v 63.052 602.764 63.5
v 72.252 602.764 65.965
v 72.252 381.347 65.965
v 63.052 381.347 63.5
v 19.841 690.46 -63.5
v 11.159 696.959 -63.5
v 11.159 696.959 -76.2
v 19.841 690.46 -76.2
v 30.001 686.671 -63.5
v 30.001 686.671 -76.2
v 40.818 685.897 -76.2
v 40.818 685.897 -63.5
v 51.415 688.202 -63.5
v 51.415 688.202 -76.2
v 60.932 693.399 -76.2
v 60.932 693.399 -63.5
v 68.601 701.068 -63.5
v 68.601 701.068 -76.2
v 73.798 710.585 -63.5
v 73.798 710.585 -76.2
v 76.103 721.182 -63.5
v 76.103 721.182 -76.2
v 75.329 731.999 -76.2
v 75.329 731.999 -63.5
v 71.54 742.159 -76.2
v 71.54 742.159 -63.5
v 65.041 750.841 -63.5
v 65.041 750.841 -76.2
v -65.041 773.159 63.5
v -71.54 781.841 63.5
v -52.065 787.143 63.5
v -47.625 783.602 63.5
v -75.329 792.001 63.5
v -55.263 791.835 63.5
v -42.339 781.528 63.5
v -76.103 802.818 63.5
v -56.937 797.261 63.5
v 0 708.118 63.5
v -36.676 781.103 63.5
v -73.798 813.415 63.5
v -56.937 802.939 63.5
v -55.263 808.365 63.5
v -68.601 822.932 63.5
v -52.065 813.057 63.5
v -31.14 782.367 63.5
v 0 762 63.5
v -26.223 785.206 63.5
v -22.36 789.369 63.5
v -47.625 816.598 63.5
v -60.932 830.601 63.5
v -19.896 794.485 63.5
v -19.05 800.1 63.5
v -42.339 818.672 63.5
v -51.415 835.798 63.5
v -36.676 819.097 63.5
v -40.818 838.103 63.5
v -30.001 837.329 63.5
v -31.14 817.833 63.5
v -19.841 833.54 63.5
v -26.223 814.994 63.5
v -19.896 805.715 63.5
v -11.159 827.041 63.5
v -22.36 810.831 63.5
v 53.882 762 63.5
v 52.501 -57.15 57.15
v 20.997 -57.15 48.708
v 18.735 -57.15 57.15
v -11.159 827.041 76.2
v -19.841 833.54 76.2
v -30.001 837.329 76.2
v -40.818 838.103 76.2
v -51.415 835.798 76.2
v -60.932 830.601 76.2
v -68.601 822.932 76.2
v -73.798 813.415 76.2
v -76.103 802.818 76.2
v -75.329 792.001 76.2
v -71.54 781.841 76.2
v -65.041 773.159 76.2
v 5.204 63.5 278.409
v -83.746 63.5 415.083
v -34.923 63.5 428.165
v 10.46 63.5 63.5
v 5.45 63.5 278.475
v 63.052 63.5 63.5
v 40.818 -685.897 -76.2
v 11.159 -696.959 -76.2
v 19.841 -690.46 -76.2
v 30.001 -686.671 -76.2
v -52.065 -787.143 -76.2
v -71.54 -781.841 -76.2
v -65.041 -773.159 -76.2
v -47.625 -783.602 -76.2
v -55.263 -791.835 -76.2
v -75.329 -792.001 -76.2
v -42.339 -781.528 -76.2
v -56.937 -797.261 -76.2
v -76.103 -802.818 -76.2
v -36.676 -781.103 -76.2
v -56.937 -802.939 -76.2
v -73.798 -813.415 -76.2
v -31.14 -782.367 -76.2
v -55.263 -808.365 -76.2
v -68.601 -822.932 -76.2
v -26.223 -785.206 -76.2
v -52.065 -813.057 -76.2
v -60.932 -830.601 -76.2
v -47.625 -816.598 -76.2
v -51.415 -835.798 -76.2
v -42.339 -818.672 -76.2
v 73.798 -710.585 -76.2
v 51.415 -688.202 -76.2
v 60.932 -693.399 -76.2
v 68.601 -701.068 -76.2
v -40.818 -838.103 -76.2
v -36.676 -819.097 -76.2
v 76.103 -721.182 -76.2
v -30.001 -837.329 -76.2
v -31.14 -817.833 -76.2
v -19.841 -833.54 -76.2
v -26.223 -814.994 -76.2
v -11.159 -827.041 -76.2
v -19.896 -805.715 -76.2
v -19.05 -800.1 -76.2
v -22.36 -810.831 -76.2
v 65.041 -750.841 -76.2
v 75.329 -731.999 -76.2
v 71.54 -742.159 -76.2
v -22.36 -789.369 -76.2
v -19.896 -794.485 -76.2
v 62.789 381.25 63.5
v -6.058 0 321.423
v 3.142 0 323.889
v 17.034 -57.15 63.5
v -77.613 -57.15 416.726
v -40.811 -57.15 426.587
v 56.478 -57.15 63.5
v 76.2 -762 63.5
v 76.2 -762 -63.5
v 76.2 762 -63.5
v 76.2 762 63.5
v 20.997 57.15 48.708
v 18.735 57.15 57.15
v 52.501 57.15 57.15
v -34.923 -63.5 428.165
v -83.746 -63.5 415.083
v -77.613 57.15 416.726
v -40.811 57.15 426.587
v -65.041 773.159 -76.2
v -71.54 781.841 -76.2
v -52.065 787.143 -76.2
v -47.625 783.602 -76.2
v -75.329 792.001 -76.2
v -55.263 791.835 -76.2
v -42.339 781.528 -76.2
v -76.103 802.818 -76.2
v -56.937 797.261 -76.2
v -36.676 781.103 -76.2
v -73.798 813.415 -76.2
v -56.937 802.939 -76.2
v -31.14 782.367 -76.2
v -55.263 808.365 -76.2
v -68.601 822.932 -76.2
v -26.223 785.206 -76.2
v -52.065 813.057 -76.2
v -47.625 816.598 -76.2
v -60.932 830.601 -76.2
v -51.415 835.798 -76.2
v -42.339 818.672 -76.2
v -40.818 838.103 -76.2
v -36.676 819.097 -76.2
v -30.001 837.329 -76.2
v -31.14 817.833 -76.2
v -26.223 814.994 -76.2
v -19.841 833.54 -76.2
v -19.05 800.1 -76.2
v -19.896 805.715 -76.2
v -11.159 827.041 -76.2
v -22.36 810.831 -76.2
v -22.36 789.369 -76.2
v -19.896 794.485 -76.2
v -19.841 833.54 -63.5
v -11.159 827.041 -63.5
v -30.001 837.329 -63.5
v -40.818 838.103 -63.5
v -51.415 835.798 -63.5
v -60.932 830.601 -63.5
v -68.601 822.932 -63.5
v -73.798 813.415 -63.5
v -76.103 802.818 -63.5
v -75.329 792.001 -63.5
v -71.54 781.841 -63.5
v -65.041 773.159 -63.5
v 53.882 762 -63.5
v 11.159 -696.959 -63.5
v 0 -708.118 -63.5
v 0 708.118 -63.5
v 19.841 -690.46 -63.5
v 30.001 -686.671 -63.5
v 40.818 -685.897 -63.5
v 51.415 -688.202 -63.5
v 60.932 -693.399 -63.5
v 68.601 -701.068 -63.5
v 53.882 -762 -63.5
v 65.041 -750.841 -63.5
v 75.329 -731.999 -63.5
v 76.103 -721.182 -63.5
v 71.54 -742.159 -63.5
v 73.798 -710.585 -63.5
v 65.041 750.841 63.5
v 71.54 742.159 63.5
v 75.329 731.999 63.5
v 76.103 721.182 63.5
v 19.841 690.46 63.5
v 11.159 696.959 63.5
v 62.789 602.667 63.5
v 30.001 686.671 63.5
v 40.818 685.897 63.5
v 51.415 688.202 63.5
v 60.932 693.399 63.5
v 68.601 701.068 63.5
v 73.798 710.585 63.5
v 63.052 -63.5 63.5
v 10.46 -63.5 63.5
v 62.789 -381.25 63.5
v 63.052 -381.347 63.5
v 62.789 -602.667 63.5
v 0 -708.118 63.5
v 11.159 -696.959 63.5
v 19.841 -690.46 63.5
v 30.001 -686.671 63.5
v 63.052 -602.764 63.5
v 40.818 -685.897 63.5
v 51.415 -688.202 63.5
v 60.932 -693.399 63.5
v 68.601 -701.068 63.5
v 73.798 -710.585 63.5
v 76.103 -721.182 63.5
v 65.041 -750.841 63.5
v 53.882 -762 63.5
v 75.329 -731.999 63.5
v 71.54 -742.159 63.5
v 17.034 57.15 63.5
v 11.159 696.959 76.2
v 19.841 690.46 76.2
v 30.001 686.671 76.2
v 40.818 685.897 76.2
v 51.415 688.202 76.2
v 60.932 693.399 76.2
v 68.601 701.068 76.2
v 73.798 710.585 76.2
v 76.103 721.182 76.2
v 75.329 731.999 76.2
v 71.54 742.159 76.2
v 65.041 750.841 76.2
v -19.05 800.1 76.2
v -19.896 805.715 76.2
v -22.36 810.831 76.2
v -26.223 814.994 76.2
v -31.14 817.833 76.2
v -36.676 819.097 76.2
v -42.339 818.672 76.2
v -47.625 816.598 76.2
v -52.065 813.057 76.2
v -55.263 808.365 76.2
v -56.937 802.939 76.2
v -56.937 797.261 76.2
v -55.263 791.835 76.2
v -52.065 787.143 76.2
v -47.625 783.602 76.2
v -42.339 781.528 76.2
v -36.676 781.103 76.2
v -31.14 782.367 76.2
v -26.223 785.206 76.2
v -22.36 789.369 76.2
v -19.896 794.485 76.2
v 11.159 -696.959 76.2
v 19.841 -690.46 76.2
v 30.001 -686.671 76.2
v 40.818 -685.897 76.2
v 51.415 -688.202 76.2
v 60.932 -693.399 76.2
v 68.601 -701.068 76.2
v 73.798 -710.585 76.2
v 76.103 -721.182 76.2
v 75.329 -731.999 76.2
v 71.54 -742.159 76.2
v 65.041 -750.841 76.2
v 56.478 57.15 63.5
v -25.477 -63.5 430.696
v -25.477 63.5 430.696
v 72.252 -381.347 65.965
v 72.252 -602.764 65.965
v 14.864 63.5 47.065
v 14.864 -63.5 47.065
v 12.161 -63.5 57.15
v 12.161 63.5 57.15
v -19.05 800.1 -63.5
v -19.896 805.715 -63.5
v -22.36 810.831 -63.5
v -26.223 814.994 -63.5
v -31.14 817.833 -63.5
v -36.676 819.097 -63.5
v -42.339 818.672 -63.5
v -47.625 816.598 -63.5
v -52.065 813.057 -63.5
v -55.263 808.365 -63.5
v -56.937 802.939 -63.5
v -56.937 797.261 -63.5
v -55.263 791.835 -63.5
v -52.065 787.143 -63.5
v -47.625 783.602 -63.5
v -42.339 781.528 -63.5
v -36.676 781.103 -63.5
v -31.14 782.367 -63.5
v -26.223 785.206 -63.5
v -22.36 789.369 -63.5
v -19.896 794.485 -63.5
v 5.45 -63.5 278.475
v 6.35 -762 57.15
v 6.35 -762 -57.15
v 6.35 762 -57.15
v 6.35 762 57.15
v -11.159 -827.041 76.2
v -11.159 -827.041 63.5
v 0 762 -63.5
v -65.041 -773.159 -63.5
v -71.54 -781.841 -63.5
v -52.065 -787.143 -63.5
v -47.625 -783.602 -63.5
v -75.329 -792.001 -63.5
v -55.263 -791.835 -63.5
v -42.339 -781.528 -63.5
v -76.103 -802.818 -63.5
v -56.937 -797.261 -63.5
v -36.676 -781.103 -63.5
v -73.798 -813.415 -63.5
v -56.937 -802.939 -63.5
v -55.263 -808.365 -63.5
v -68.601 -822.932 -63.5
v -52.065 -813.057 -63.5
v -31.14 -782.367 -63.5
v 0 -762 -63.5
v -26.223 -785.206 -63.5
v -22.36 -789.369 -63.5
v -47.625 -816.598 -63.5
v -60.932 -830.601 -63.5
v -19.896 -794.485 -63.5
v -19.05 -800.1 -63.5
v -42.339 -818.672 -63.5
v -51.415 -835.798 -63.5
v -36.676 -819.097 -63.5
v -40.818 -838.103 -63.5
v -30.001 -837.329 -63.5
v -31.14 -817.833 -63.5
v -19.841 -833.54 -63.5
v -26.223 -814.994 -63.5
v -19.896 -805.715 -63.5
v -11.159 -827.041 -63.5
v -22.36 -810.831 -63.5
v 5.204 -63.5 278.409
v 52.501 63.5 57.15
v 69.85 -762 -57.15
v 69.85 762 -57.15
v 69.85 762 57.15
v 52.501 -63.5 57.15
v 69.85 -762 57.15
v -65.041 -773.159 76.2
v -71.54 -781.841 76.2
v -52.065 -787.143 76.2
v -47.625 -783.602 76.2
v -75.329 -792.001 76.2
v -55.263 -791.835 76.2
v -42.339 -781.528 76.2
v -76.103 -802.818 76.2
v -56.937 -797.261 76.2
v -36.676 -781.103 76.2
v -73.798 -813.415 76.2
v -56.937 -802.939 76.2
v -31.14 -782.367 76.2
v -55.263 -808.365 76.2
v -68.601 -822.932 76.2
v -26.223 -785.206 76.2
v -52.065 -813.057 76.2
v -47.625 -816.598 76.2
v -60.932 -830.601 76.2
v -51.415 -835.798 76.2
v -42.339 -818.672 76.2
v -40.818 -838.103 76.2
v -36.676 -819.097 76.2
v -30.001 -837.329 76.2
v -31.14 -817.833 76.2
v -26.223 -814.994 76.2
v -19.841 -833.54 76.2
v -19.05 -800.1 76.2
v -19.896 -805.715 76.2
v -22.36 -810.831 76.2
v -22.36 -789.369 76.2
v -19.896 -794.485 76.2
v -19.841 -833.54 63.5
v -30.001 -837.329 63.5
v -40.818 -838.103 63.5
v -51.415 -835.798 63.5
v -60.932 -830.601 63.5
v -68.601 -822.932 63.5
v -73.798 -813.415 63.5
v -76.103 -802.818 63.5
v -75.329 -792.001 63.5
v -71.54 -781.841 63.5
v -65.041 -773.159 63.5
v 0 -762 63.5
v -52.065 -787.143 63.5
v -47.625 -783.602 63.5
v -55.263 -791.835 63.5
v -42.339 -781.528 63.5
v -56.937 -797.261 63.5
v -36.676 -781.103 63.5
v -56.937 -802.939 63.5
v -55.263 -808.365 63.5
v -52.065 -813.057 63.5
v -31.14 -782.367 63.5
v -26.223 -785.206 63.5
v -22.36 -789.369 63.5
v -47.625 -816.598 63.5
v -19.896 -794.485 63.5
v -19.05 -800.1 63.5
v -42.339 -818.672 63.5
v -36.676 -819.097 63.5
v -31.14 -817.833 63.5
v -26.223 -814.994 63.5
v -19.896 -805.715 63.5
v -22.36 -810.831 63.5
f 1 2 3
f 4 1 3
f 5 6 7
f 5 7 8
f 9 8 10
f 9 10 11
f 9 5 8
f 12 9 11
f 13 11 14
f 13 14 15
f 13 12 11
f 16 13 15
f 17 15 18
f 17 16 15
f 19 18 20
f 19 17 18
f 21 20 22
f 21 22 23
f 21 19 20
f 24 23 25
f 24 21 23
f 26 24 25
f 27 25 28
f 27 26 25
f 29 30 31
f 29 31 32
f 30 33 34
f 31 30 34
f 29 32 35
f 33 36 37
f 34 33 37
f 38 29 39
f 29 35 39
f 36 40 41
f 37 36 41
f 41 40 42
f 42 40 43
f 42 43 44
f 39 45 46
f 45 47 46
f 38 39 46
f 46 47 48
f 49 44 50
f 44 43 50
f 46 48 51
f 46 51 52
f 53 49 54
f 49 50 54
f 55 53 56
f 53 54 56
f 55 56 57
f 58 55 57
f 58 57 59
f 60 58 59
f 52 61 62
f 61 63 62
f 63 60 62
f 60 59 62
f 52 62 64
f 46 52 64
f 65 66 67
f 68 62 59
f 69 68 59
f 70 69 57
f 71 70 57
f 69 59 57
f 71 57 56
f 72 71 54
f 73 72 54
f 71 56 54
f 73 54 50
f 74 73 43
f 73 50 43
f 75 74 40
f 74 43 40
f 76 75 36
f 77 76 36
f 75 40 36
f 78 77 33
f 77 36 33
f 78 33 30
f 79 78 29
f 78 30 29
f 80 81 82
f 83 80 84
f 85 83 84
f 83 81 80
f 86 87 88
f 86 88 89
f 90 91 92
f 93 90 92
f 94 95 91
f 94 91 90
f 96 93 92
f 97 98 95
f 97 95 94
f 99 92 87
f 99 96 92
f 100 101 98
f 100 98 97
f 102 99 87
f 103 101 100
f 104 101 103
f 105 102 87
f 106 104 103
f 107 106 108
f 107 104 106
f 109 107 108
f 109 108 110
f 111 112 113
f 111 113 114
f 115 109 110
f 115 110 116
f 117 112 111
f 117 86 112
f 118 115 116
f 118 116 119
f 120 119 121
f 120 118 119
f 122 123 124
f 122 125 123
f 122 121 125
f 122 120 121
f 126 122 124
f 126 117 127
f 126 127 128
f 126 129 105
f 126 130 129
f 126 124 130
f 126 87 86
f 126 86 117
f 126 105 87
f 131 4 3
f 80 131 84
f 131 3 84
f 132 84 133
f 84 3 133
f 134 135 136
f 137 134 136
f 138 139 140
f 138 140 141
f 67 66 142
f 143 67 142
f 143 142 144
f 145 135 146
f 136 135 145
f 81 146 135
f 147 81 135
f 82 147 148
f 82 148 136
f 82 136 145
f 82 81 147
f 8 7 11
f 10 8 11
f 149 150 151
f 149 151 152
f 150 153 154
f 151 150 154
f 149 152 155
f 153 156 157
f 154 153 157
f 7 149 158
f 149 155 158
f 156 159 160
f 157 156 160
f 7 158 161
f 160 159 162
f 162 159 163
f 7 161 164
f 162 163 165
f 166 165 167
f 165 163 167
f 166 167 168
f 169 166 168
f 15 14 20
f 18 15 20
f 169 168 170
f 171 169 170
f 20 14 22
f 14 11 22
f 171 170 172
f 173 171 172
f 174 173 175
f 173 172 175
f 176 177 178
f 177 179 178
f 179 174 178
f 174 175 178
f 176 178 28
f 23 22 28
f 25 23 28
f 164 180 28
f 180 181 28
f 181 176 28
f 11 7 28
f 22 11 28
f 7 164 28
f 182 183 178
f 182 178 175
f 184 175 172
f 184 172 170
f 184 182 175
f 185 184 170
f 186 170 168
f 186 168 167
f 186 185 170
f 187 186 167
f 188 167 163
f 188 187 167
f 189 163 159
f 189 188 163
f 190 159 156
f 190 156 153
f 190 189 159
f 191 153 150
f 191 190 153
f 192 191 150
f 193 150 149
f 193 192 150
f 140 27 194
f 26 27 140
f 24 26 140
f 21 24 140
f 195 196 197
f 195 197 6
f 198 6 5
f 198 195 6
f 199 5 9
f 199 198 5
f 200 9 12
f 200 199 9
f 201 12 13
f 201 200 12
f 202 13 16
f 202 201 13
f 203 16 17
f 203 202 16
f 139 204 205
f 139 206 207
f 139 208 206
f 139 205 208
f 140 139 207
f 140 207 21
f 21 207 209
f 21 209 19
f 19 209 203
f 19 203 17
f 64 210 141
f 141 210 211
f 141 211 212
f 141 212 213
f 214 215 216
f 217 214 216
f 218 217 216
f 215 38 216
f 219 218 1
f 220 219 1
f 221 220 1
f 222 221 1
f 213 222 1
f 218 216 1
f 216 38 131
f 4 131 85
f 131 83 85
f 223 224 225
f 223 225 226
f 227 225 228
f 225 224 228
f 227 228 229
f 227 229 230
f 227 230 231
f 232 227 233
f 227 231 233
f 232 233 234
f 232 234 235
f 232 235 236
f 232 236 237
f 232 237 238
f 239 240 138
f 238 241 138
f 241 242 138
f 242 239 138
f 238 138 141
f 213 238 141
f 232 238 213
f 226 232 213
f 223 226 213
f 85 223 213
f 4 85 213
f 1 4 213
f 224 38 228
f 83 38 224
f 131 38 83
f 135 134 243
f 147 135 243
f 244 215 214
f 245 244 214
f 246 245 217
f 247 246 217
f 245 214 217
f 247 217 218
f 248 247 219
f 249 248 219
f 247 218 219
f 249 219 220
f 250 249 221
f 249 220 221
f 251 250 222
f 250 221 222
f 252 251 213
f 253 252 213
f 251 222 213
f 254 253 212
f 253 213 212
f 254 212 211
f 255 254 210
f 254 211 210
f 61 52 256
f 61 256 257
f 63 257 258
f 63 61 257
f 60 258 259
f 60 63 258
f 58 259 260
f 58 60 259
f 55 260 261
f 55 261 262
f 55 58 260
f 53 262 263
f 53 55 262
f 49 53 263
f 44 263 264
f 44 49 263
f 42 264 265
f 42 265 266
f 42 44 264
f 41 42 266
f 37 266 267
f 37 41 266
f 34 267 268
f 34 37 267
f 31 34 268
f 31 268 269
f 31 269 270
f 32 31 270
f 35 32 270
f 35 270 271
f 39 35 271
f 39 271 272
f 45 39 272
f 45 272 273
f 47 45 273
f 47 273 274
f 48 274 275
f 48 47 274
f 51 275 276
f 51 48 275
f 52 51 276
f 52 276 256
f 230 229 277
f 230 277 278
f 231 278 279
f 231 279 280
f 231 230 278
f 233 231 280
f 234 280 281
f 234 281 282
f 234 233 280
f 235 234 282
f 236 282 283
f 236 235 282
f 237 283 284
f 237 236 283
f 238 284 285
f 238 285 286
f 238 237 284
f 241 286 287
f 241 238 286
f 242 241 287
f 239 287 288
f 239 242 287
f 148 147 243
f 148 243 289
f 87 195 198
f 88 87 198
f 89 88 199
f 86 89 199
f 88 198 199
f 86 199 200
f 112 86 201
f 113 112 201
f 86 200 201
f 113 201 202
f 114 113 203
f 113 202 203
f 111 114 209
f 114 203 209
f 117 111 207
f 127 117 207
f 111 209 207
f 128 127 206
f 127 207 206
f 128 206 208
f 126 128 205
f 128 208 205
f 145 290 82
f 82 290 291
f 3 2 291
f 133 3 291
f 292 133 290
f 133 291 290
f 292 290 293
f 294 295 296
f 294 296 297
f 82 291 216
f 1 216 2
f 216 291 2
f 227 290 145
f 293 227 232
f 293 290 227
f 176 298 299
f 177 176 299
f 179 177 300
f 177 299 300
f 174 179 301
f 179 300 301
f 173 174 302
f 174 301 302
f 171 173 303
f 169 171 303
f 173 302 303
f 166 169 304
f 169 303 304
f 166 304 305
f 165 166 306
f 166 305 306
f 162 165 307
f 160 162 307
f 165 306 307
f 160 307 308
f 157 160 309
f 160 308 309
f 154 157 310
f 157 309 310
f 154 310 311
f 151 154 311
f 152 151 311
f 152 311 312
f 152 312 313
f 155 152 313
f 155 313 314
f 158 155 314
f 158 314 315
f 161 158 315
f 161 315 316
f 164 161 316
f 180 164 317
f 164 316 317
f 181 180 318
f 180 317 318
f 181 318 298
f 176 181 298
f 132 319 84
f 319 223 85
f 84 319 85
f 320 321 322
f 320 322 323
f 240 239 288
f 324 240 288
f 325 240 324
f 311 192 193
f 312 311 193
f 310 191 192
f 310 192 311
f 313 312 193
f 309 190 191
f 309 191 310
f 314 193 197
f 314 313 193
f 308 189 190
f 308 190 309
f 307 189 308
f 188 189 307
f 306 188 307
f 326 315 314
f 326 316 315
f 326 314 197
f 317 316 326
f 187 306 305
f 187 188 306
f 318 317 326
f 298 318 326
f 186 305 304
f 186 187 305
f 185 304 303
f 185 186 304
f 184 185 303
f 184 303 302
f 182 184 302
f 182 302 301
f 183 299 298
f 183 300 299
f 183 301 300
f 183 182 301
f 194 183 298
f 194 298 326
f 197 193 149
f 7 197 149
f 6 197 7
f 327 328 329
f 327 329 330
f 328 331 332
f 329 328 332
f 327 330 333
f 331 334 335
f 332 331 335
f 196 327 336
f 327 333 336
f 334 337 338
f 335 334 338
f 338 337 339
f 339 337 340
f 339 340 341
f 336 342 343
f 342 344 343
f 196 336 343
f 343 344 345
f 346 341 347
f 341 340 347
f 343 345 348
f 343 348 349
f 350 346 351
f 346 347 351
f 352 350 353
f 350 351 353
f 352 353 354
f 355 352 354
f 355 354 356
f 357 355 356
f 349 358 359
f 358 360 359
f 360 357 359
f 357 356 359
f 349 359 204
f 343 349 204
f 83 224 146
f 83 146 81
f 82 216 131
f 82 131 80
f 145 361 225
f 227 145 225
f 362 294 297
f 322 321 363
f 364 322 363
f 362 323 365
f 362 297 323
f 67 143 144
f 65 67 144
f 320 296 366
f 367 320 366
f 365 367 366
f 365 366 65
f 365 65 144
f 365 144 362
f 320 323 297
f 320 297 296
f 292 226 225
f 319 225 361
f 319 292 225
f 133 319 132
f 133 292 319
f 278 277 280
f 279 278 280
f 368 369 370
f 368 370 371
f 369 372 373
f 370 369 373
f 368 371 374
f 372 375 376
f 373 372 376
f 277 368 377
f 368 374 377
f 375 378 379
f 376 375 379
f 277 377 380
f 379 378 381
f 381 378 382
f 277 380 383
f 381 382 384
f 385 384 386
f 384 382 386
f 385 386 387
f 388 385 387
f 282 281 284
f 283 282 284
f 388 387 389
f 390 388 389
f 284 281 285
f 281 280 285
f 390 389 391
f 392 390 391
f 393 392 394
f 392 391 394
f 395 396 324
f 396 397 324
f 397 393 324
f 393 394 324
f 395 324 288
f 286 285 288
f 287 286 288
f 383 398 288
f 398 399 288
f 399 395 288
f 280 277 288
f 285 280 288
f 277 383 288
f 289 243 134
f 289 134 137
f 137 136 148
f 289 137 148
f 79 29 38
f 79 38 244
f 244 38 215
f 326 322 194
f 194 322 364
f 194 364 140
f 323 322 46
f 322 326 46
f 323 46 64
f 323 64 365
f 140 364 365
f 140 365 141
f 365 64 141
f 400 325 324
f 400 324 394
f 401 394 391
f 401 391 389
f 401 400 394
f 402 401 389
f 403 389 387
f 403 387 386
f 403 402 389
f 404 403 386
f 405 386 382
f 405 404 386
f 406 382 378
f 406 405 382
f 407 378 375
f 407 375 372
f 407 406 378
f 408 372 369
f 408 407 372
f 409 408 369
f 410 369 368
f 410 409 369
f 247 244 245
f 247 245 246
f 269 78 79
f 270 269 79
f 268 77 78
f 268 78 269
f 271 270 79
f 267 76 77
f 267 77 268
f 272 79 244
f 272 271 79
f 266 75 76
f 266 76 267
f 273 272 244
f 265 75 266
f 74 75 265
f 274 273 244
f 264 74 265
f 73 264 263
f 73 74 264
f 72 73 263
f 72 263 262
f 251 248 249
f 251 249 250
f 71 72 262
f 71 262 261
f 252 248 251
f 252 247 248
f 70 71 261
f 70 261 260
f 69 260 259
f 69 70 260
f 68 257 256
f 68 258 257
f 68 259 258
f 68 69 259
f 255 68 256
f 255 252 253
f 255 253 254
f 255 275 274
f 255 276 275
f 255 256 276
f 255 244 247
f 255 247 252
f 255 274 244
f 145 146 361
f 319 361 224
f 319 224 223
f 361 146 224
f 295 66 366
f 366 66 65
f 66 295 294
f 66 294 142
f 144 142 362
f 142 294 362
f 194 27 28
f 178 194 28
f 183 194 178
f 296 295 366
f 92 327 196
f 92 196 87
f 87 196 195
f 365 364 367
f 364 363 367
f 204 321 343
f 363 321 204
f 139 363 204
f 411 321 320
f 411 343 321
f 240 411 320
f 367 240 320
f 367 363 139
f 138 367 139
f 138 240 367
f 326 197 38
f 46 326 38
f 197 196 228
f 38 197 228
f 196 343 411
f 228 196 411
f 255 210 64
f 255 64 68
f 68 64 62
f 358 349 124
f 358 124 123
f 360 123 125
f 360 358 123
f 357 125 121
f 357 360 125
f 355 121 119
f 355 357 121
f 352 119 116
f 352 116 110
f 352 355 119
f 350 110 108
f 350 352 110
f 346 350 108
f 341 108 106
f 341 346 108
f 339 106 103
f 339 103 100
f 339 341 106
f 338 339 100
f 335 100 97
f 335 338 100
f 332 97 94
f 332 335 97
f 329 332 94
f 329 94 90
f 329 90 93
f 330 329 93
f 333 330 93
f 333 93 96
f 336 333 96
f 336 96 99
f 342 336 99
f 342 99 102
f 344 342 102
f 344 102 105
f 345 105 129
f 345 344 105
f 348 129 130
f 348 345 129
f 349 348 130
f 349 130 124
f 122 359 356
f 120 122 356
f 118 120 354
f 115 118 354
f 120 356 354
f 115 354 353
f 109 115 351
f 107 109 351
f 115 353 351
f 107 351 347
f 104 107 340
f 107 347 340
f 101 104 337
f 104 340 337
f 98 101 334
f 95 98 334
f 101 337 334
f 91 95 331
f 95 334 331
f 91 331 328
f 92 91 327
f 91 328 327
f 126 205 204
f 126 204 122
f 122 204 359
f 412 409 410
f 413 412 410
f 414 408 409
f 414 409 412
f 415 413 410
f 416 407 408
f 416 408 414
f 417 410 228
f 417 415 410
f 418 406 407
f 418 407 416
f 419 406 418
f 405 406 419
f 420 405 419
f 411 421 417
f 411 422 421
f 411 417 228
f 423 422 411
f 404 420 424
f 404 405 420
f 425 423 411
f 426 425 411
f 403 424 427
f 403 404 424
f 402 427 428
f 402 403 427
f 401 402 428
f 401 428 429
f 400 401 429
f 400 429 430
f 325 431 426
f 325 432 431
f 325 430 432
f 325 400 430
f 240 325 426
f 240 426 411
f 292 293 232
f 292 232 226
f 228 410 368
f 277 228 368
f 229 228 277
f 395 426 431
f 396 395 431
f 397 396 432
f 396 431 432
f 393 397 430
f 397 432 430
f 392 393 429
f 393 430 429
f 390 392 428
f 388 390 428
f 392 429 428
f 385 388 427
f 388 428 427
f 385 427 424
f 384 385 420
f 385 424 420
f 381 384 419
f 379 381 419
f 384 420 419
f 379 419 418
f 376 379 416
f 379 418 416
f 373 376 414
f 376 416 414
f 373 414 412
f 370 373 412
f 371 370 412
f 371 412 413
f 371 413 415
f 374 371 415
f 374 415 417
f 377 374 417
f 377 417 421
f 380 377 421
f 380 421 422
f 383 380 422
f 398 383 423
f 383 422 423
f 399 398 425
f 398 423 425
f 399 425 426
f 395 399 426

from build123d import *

# Parameters (mm, degrees)
F0_W           = 76.2
F0_H           = 127
F0_W_2         = 63.5
F0_H_2         = 114.3
F1_DEPTH       = 762
F2_R           = 19.05
F3_DEPTH       = 12.7
F9_W           = 50.8
F9_H           = 127
F9_W_2         = 38.1
F9_H_2         = 114.3
F10_DEPTH      = 381
F12_DEPTH      = 9.525
F12_DEPTH_BACK = 0.254


with BuildPart() as f1:
    # F0 (on Front) → F1 (new body, symmetric)
    with BuildSketch(Plane.XZ):
        with Locations((38.1, 0)):
            Rectangle(F0_W, F0_H)
        with Locations((38.1, 0)):
            Rectangle(F0_W_2, F0_H_2, mode=Mode.SUBTRACT)
    extrude(amount=F1_DEPTH, both=True)

    # F2 (on face) → F3 (join)
    with BuildSketch(Plane.XY.offset(63.5)):
        with BuildLine():
            ThreePointArc((-11.159232, 827.040768), (-65.040768, 827.040768), (-65.040768, 773.159232))
            Line((-65.040768, 773.159232), (11.159232, 696.959232))
            ThreePointArc((11.159232, 696.959232), (65.040768, 696.959232), (65.040768, 750.840768))
            Line((65.040768, 750.840768), (-11.159232, 827.040768))
        make_face()
        with Locations((-38.1, 800.1)):
            Circle(F2_R, mode=Mode.SUBTRACT)
    extrude(amount=F3_DEPTH)

    # F4: F1 across plane


with BuildPart() as f1_1:
    add(f1.part)
    add(f1.part.mirror(Plane.XY))

    # F9 (on face) → F10 (join)
    with BuildSketch(Plane(origin=(-10.770568, 0, 40.196307), x_dir=(0.965926, 0, 0.258819), z_dir=(-0.258819, 0, 0.965926))):
        with Locations((51.938557, 0)):
            Rectangle(F9_W, F9_H)
        with Locations((51.938557, 0)):
            Rectangle(F9_W_2, F9_H_2, mode=Mode.SUBTRACT)
    extrude(amount=F10_DEPTH)

    # F11 (on face) → F12 (join, two sides)
    with BuildSketch(Plane(origin=(74.70331, 0, 20.016692), x_dir=(0, 1, 0), z_dir=(0.965926, 0, 0.258819))) as f12_sk:
        Polygon((0, 422.614279), (-63.5, 422.614279), (-602.764468, 45.017233), (-381.346724, 45.017233), (0, 312.039085), align=None)
    extrude(amount=F12_DEPTH)
    extrude(f12_sk.sketch, amount=-F12_DEPTH_BACK)

    # F13: F1 across face


with BuildPart() as f1_2:
    add(f1_1.part)
    add(f1_1.part.mirror(Plane(origin=(-15.767609, 0, 376.059646), x_dir=(-1, 0, 0), z_dir=(0, 1, 0))))


solid = f1_2.part
